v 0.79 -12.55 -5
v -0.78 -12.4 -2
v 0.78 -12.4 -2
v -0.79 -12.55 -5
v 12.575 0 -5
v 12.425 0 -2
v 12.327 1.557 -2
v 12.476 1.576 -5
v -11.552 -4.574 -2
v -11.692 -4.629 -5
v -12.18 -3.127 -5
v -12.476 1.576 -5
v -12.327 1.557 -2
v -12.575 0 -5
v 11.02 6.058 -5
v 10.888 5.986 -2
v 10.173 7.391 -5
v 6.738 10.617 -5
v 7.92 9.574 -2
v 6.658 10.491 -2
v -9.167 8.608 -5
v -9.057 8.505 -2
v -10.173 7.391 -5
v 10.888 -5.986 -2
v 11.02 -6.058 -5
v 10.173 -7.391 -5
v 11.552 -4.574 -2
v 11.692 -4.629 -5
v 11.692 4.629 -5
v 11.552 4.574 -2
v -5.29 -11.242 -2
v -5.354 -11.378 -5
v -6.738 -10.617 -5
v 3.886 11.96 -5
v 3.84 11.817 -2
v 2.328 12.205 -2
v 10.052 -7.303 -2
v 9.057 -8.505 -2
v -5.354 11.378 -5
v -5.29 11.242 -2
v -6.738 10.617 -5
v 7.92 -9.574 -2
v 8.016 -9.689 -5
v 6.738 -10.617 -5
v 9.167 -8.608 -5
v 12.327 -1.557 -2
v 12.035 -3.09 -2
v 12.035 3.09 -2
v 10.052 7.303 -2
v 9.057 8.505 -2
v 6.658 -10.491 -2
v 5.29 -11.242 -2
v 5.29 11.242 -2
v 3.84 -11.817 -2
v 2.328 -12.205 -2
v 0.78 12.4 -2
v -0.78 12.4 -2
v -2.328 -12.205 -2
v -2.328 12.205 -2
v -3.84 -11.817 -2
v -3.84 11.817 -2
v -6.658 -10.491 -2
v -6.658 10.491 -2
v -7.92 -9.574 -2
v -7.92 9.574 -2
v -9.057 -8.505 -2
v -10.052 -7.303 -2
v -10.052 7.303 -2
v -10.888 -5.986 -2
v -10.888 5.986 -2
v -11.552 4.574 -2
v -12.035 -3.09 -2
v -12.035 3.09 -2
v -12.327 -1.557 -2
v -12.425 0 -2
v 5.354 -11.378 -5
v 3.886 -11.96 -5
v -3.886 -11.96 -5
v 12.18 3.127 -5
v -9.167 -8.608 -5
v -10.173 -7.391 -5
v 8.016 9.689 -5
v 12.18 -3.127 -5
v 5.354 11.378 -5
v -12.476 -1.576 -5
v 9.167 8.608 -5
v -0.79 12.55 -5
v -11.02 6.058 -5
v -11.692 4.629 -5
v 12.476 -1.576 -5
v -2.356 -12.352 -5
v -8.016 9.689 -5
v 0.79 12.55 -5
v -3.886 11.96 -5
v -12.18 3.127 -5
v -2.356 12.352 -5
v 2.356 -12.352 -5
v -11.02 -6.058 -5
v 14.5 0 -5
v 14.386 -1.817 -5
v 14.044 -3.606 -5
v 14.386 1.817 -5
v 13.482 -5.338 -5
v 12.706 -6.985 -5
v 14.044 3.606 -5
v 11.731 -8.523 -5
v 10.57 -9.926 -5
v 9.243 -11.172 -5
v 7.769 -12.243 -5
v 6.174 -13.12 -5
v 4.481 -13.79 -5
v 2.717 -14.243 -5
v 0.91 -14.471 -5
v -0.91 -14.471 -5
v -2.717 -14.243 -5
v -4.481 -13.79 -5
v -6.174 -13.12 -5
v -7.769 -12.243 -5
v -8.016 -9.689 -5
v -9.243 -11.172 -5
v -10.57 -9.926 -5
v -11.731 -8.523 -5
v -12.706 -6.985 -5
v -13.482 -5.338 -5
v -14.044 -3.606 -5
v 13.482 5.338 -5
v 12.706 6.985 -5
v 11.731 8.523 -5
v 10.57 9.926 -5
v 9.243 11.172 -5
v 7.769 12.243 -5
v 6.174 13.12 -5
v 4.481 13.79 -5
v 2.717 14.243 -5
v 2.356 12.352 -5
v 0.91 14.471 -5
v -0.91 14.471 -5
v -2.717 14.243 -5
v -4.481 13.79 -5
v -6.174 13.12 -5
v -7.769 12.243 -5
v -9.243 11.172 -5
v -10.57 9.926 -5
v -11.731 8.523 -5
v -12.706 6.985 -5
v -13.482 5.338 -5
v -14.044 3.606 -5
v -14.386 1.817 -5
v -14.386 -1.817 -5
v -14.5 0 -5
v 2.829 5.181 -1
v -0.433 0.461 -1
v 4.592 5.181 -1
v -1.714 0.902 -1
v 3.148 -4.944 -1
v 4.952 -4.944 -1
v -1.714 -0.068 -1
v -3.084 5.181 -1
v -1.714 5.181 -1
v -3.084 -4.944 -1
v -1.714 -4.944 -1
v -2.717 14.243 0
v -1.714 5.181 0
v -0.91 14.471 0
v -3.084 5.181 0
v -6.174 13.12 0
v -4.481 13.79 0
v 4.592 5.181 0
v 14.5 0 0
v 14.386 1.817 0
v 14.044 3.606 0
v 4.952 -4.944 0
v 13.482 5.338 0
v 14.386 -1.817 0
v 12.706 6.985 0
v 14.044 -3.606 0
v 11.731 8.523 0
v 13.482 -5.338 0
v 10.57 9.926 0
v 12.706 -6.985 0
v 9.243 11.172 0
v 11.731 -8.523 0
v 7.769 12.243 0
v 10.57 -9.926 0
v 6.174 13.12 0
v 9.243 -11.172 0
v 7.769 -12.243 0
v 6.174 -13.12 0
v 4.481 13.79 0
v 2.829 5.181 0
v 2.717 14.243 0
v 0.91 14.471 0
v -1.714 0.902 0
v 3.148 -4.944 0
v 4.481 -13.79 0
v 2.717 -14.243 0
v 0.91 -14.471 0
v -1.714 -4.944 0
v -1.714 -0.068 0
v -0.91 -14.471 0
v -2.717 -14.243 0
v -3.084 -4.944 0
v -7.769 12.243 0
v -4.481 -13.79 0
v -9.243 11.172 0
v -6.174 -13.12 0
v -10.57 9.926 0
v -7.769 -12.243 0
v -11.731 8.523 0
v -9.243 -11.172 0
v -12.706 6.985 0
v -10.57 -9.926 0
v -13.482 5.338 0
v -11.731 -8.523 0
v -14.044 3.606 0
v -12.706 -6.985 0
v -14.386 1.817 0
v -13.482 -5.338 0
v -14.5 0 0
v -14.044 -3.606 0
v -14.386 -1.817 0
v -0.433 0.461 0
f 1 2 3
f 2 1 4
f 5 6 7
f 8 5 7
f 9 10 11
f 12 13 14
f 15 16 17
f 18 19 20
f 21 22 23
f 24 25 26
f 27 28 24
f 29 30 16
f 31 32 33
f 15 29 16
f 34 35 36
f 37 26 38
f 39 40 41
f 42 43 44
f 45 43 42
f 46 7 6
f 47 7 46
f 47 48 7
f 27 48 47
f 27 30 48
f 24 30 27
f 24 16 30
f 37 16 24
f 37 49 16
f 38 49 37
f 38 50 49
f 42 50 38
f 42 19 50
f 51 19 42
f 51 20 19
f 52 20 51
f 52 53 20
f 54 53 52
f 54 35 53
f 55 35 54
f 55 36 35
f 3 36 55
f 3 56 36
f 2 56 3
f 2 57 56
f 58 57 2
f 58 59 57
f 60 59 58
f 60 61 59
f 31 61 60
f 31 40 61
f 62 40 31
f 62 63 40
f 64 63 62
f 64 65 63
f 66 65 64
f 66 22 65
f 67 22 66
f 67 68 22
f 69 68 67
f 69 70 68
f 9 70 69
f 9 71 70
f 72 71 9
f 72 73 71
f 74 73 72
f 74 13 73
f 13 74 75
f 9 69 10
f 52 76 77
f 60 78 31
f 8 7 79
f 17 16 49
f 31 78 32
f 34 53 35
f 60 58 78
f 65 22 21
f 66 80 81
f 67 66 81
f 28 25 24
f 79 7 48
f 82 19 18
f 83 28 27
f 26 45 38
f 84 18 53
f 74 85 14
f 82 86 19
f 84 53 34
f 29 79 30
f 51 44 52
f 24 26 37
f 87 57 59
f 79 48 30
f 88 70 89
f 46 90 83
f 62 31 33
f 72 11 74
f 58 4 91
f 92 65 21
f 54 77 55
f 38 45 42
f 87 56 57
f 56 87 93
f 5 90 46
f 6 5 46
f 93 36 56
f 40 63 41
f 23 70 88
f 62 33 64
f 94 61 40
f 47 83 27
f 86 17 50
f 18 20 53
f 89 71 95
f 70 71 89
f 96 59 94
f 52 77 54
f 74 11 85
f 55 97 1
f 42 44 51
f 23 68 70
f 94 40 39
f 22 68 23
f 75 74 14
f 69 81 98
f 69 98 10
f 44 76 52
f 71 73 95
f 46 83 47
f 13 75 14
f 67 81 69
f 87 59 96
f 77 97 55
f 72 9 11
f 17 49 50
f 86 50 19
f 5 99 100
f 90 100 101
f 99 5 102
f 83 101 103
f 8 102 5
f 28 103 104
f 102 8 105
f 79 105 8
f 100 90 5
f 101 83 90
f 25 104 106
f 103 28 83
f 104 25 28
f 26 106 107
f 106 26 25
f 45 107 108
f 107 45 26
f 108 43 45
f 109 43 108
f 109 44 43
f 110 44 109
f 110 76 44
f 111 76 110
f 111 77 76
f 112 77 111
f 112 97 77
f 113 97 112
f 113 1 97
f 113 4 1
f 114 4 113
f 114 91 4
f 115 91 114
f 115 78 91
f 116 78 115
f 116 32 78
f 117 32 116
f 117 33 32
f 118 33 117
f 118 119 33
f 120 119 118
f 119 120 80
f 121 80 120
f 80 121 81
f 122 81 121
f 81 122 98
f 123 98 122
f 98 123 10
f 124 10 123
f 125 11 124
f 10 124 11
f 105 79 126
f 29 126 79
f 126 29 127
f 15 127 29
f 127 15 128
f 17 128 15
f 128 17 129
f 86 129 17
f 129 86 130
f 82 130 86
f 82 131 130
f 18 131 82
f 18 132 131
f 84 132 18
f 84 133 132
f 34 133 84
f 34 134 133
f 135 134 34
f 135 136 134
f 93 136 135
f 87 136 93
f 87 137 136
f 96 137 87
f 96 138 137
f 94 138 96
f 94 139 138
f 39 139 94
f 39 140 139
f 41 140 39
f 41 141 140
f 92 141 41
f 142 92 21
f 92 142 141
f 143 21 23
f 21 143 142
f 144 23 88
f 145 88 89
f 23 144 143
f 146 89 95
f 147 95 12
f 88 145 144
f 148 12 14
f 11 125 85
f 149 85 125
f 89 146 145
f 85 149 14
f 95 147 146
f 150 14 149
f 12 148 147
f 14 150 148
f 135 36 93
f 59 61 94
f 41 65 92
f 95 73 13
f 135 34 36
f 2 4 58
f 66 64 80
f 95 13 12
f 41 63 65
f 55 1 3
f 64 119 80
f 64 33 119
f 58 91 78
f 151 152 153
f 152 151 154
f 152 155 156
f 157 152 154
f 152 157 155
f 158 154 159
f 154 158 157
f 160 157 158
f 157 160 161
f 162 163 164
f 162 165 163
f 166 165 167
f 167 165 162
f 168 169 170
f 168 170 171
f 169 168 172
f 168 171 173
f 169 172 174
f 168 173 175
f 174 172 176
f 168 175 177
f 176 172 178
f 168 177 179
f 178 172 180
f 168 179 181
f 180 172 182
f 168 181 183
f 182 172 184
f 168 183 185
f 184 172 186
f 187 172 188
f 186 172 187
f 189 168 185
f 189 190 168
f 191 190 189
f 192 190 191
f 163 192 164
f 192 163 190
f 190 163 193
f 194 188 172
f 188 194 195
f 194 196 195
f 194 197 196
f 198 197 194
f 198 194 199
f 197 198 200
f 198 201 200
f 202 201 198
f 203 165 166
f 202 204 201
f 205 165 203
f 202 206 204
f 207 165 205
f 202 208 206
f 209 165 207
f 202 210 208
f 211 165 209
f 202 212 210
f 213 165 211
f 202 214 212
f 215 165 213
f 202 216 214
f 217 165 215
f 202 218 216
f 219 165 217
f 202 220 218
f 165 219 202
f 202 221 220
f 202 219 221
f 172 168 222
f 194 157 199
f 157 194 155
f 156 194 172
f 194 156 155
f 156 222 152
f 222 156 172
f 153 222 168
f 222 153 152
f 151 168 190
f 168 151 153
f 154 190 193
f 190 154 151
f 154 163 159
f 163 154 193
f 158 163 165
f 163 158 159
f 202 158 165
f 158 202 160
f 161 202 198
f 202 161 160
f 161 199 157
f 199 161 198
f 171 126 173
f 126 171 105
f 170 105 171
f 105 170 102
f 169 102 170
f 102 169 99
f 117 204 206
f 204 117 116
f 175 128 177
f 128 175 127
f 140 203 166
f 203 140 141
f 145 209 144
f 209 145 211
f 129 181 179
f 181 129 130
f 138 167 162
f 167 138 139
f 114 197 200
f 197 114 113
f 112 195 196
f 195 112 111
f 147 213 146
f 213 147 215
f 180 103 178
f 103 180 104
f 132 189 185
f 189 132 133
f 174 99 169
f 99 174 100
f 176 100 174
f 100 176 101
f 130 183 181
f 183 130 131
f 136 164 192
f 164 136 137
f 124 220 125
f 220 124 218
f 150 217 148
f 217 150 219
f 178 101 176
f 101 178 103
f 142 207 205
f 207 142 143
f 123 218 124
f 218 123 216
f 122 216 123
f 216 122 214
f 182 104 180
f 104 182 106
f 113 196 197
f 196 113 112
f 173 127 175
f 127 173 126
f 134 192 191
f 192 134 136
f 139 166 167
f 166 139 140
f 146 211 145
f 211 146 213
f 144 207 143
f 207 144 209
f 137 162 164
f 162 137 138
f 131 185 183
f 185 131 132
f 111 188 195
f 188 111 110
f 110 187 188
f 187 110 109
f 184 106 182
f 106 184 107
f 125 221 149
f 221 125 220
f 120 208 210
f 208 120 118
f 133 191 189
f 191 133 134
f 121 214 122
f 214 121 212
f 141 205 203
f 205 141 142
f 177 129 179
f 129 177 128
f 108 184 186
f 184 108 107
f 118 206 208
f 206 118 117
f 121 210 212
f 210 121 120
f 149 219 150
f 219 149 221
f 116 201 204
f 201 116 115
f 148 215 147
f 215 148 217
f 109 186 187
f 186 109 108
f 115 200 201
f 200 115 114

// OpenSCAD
$fn = 50;


difference() {
	union() {
		translate(v = [0, 0, -5.0000000000]) {
			cylinder(h = 5, r = 14.5000000000);
		}
	}
	union() {
		#translate(v = [0, 0, -5.0000000000]) {
			cylinder(h = 3, r1 = 12.5750000000, r2 = 12.4250000000);
		}
		translate(v = [0, 0, -1]) {
			linear_extrude(height = 1) {
				text(font = "Impact", halign = "center", size = 10, text = "K", valign = "center");
			}
		}
	}
}
